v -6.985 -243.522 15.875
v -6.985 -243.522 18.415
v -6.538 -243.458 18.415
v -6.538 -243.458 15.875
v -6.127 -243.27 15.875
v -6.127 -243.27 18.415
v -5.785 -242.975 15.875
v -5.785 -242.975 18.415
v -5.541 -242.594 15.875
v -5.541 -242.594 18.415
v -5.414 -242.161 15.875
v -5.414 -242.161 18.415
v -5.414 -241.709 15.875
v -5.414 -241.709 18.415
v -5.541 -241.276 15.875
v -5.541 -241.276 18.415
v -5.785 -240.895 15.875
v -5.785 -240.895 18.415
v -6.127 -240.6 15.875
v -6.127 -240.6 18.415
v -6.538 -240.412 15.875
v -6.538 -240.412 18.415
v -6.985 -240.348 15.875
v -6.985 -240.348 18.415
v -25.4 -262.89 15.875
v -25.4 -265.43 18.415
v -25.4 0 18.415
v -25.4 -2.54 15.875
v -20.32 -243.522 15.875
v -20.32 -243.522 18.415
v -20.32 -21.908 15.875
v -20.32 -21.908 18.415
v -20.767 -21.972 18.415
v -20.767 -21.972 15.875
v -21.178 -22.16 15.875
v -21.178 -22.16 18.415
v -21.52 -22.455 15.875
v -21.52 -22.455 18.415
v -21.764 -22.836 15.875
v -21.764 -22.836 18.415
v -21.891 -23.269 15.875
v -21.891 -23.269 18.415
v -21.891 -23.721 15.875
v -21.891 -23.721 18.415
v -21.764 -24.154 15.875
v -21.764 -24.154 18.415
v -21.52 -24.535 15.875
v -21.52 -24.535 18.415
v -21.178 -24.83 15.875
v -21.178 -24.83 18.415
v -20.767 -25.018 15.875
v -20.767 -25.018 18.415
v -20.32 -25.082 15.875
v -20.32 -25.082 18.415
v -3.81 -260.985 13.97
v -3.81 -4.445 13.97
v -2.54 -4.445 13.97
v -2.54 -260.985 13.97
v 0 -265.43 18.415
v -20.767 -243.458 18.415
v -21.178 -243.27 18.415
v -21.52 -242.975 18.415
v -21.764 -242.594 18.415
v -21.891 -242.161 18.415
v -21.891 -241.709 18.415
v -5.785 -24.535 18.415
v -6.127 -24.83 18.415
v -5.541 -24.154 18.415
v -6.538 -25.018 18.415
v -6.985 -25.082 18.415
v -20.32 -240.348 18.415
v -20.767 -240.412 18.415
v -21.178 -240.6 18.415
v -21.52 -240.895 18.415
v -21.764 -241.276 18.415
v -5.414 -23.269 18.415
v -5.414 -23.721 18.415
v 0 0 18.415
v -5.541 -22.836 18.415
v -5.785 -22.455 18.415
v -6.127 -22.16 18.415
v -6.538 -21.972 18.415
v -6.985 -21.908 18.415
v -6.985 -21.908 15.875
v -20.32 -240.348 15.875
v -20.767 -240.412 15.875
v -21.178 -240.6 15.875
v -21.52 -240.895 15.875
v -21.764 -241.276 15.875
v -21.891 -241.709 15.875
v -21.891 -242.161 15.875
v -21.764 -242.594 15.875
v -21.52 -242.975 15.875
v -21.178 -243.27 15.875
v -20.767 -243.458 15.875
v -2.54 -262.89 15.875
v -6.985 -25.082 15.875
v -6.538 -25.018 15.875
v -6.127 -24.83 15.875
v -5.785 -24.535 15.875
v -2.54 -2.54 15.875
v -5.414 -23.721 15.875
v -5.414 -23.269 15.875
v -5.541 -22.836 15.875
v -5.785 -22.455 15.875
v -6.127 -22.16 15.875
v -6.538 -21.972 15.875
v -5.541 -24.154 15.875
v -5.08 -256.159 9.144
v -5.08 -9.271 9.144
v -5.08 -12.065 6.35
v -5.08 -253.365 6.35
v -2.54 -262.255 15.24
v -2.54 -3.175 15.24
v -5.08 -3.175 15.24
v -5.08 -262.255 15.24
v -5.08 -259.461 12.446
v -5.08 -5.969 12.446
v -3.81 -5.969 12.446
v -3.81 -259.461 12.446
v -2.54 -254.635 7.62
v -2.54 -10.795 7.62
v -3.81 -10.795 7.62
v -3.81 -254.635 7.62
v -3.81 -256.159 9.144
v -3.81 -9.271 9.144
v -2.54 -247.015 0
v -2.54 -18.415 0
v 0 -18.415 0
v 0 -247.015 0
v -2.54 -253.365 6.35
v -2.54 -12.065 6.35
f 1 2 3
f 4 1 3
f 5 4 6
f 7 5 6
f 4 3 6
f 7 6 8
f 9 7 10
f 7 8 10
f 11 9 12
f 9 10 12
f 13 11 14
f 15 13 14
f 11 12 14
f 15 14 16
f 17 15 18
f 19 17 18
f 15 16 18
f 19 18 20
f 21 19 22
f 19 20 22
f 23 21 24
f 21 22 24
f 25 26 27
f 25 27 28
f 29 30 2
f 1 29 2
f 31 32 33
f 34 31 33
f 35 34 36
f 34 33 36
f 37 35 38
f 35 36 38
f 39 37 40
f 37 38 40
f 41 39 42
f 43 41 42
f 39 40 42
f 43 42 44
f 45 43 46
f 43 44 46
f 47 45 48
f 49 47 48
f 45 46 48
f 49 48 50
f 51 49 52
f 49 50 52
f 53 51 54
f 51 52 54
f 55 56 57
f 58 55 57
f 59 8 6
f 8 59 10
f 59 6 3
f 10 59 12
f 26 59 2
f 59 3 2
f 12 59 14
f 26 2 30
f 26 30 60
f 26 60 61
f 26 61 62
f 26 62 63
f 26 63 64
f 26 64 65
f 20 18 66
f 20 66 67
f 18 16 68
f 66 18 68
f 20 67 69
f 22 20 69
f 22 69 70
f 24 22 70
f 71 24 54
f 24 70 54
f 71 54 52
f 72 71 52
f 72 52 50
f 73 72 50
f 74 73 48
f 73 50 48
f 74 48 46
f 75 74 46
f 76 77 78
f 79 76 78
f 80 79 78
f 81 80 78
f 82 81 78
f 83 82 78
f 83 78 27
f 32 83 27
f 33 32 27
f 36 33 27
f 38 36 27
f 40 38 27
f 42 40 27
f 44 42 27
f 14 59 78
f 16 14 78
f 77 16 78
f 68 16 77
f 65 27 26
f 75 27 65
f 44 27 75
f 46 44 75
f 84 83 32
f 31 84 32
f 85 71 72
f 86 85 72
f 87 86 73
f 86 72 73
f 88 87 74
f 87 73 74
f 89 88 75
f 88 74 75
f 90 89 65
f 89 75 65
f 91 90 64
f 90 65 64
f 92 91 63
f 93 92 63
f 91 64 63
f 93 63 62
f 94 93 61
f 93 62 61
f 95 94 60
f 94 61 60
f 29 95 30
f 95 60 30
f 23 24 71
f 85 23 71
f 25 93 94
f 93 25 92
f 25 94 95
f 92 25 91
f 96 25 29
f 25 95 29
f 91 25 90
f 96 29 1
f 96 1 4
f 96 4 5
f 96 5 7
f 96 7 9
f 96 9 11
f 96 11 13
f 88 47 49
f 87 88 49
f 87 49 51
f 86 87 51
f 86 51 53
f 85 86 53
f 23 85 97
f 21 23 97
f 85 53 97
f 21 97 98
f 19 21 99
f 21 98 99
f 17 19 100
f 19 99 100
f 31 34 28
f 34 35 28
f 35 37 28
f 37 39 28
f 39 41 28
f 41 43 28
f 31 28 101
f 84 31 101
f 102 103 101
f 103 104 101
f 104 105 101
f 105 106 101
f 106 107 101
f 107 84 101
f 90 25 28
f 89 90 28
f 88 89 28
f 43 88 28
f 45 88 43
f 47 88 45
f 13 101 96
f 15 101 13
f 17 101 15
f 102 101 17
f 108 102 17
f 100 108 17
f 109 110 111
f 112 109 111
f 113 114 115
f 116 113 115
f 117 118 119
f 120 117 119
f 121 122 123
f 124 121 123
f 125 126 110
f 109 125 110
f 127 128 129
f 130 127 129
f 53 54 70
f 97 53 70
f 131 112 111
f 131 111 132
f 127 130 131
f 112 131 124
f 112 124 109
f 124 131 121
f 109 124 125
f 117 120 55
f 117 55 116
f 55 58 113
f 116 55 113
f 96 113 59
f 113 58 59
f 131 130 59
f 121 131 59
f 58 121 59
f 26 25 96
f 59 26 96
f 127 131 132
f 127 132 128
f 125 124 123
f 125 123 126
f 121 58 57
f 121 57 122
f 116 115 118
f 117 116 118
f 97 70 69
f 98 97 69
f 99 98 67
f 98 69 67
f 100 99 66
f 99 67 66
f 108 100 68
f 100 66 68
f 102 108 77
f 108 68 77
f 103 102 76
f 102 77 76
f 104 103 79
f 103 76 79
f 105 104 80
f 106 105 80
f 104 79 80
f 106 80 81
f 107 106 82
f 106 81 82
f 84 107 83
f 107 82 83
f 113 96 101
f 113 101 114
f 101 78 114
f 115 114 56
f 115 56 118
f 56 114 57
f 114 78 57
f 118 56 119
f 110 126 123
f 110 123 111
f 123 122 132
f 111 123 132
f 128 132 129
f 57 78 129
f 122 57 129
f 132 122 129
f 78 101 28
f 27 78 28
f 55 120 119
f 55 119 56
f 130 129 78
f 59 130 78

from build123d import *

# Parameters (mm, degrees)
F1_DEPTH = 265.43
F3_DEPTH = 25.4
F5_DEPTH = 2.54


with BuildPart() as f1:
    # F0 (on Front) → F1 (new body)
    with BuildSketch(Plane.XZ):
        Polygon((-2.54, 0), (0, 0), (0, 18.415), (-25.4, 18.415), (-25.4, 15.875), (-2.54, 15.875), (-2.54, 15.24), (-5.08, 15.24), (-5.08, 12.446), (-3.81, 12.446), (-3.81, 13.97), (-2.54, 13.97), (-2.54, 7.62), (-3.81, 7.62), (-3.81, 9.144), (-5.08, 9.144), (-5.08, 6.35), (-2.54, 6.35), align=None)
    extrude(amount=F1_DEPTH)

    # F2 (on face) → F3 (cut)
    with BuildSketch(Plane.YZ):
        Polygon((-247.015, 0), (-265.43, 18.415), (-265.43, 0), align=None)
        Polygon((0, 0), (0, 18.415), (-18.415, 0), align=None)
    extrude(amount=-F3_DEPTH, mode=Mode.SUBTRACT)

    # F4 (on face) → F5 (cut)
    with BuildSketch(Plane.XY.offset(18.415)):
        with BuildLine():
            Line((-6.985, -240.3475), (-20.32, -240.3475))
            ThreePointArc((-20.32, -240.3475), (-21.9075, -241.935), (-20.32, -243.5225))
            Line((-20.32, -243.5225), (-6.985, -243.5225))
            ThreePointArc((-6.985, -243.5225), (-5.3975, -241.935), (-6.985, -240.3475))
        make_face()
        with BuildLine():
            ThreePointArc((-20.32, -21.9075), (-21.9075, -23.495), (-20.32, -25.0825))
            Line((-20.32, -25.0825), (-6.985, -25.0825))
            ThreePointArc((-6.985, -25.0825), (-5.3975, -23.495), (-6.985, -21.9075))
            Line((-6.985, -21.9075), (-20.32, -21.9075))
        make_face()
    extrude(amount=-F5_DEPTH, mode=Mode.SUBTRACT)


solid = f1.part
